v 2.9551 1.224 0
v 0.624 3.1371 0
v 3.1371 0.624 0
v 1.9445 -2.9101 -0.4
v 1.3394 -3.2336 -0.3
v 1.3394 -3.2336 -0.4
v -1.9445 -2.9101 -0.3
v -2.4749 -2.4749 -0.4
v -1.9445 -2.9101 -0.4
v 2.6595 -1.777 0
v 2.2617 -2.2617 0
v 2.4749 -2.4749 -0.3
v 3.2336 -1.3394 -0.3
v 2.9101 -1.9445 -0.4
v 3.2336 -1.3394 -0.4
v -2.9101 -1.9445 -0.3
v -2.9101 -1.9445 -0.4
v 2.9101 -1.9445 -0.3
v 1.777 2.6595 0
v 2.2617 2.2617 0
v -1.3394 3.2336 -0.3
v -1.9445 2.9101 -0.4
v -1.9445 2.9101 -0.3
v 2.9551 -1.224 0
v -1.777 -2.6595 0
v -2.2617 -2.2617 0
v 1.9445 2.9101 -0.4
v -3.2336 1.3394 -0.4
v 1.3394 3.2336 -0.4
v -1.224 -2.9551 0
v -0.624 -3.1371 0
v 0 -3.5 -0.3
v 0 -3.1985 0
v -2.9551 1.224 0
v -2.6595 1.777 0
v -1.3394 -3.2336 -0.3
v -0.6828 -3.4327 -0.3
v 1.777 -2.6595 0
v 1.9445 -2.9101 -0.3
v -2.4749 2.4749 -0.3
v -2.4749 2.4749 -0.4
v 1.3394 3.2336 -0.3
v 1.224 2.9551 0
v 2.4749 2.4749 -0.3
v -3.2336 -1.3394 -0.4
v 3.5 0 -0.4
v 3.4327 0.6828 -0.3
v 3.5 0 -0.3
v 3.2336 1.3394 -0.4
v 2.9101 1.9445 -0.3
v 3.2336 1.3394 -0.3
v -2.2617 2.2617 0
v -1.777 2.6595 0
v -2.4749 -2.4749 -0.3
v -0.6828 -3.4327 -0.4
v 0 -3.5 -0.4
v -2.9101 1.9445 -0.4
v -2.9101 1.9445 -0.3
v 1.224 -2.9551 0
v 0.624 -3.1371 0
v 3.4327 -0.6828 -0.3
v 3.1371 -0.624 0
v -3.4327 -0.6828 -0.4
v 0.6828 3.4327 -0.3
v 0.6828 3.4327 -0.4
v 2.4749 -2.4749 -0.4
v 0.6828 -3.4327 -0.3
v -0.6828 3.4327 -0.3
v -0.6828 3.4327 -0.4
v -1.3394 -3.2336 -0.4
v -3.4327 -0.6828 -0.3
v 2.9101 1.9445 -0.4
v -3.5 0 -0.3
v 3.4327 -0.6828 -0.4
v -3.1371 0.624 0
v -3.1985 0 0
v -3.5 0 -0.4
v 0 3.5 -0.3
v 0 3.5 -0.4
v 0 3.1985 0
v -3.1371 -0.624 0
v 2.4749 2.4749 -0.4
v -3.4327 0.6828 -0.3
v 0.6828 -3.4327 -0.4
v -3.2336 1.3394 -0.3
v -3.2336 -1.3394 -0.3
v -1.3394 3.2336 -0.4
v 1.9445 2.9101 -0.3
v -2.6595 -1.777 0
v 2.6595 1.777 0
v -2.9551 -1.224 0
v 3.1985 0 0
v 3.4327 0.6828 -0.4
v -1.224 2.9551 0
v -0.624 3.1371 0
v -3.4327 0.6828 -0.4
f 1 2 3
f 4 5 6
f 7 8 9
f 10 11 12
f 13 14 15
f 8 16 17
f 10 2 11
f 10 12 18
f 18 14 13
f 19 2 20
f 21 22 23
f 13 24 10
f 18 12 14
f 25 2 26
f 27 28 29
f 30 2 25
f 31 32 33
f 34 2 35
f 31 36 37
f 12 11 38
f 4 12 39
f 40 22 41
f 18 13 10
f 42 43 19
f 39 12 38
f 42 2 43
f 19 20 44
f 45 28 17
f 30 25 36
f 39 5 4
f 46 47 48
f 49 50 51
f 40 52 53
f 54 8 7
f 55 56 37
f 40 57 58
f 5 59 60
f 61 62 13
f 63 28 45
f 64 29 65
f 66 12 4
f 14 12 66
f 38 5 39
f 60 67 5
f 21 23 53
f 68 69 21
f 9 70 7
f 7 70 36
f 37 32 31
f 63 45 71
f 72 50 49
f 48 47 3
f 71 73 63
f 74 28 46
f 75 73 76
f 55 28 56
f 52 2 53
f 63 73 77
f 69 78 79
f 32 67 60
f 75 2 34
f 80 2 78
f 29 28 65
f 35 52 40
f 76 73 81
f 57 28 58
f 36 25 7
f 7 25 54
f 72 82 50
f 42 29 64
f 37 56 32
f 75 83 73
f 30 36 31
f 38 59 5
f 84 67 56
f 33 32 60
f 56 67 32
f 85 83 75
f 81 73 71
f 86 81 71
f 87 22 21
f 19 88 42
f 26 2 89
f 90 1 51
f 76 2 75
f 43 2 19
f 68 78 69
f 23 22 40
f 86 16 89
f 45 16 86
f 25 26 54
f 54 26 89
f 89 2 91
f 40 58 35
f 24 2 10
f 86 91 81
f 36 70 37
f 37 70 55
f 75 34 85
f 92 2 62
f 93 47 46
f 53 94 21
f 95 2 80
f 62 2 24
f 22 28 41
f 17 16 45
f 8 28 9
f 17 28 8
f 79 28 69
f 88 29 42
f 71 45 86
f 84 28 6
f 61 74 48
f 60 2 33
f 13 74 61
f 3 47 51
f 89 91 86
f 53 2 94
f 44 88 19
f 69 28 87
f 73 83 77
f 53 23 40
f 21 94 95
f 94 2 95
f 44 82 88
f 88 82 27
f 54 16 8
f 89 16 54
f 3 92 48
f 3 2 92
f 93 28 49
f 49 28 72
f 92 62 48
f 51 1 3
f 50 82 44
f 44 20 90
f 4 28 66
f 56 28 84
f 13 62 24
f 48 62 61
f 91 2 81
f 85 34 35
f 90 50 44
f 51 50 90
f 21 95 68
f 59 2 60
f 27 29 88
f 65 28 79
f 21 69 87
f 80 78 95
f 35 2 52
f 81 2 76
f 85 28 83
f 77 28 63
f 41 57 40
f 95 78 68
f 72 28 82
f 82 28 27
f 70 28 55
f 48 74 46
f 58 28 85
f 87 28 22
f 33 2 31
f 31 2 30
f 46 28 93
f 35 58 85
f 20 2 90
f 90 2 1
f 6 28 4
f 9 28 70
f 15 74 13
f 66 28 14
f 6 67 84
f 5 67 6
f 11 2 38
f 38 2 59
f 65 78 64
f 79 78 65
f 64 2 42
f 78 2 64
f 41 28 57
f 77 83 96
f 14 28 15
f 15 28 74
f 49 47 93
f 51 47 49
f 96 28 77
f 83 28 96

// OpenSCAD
// LibFile: stemfie_electrics.scad 
//   Author: Brendon Collecutt  
//   .
//   Contact: 1976016983@qq.com
//   .
//   This file is part of Stemfie_OpenSCAD.
//   .
//   Stemfie_OpenSCAD is free software: you can redistribute it and/or modify it under the terms of the GNU General Public License as published by the Free Software Foundation, either version 3 of the License, or (at your option) any later version.
//   .
//   Stemfie_OpenSCAD is distributed in the hope that it will be useful, but WITHOUT ANY WARRANTY; without even the implied warranty of MERCHANTABILITY or FITNESS FOR A PARTICULAR PURPOSE. See the GNU General Public License for more details.
//   .
//   You should have received a copy of the GNU General Public License along with Stemfie_OpenSCAD. If not, see <https://www.gnu.org/licenses/>.
//   .
//   Please check https://stemfie.org/license for more information or before using stemfie commercially.  
//   .
//   OpenSCAD script for creating Stemife.org parts.  
//   .
//   Feel free to adapt and improve and share your OpenSCAD script (please contact Paulo Kiefe)  
//   .
//   Contact: paulo.kiefe@stemfie.org (https://stemfie.org)
// Includes:
//   include <stemfie_electrics.scad>

include <stemfie.scad>

Terminal_Panel_Diameter = 8;
Terminal_Panel_Thickness = 2;
Terminal_Max_Diameter = 11;
Terminal_Length = 12;

// Module: motor_shaft()
// Usage:
//   motor_shaft(length = 1, thread_length = 0.75);
// Description:
//   Creates a internally threaded motor shaft.
// Example(3D):
//   motor_shaft();
module motor_shaft(length = 1, thread_length = 0.75)
{
  D()
  {
    Tz(Clearance)
      Cy(d = BU - Clearance * 2, h = length * BU - Clearance, C = false);

    BU_Tz(length)
      Rx(180)
        thread(length = thread_length, center = false, internal = true, bevel = [true, false]);
  }
}

// Module: motor_shaft_N20()
// Usage:
//   motor_shaft_N20(N20_shaft_length = 4);
// Description:
//   Creates STEMFIE motor shaft to fit N20 motor shaft.
// Example(3D)
//   motor_shaft_N20(N20_shaft_length = 7);
module motor_shaft_N20(N20_shaft_length = 4)
{
  min_thread_length = 0.5;
  thread_motor_shaft_gap = 0.4;
  shaft_length = ceil(min_thread_length + (N20_shaft_length + thread_motor_shaft_gap - 2) / BU);
  thread_length = shaft_length - (N20_shaft_length + thread_motor_shaft_gap - 2) / BU;

  BU_Tz(shaft_length)
    Rx(180)
      D()
      {
        U()
        {
          motor_shaft(length = shaft_length, thread_length = thread_length);

          Tz(-2)
            Cy(d = 9, h = 3, C = false);
        }
        Tz(-2)
        {
          D()
          {
            U()
              Cy(d = 3, h = (N20_shaft_length - Clearance) * 2);

            Ty(1.5)
              Cu([3, 1.1, N20_shaft_length * 2]);
          }

          Ty(0.5)
            Cu([3,1, (N20_shaft_length - Clearance) * 2]);
        }
      }
}


// Module: motor_case_N20()
// Usage:
//   motor_case_N20(motor_length = 24, half_only = true);
// Description:
//   Creates a STEMFIE motor case to fit an N20 geared motor.
// Example(3D): Standard case
//   motor_case_N20();
// Example(3D):
//   motor_case_N20(motor_length = 30, half_only = false);
module motor_case_N20(motor_length = 24, half_only = true)
{
  motor_width = 12;
  motor_height = 10;
  case_length = ceil(motor_length / BU) + 1;

  D()
  {
    //Main block
    BU_cube([3, case_length,1]);
    
    //Remove half
    if(half_only)
      BU_Tz(0.5)
        Cu([3 * BU + 1, case_length * BU + 1, BU], C = true);

    //Motor cutout
    BU_Ty(case_length / 2)
      Ty(-motor_length/2 - 2)
        Cu([motor_width + Clearance, motor_length + Clearance * 2, motor_height + Clearance]);

    //Motor shaft opening
    BU_Ty(case_length / 2)
      Rx(90)
        Cy(d = 10, h = BU + 2);

    //Motor rear end space.
    BU_Ty(-case_length / 2)
      T(-motor_width / 2, 6, -5.5/2)
        Cu([motor_width, case_length * BU - motor_length - 6, 5.5], C = false);

    RKy(180)
    {
      //STEMFIE mounting holes
      BU_Ty(0.5)
        BU_Tx(1)
          hole_grid([1,case_length - 1]);
      
      //Tab connector holes
      BU_T(x = -1.1, y = case_length/2 - 1)
        tab_connector_cutout();
      BU_T(x = 0.4, y = -case_length/2)
        Ty(3)
          tab_connector_cutout();

      //Banana terminal cutout
      BU_Tx(-1)
        BU_Ty(-case_length / 2)
          Rx(90)
            terminal_cutout();
    }
  }
}

// Module: terminal_cutout()
// Usage:
//   terminal_cutout(solder_tab = true);
// Description:
//   Creates a cutout to fit a banana terminal.
// Example(3D):
//   terminal_cutout();
// Example(3D): Split your part in two to fit the terminal inside.
//   difference()
//   {
//     BU_cube([2,1,1]);
//   
//     BU_Tx(1)
//       Ry(90)
//         Rz(90)
//           terminal_cutout();
//   
//     Tz(1.5 * BU)
//       cube(3 * BU, center = true);
//   }
module terminal_cutout(solder_tab = true)
{
  Sz(-1)
  {
    Tz(-0.1)
      Cy(h = Terminal_Panel_Thickness + 0.2, d = Terminal_Panel_Diameter + Clearance, C = false);

    Tz(Terminal_Panel_Thickness)
      Cy(h = Terminal_Length - Terminal_Panel_Thickness, d = Terminal_Max_Diameter + Clearance, C = false);

    Tz(Terminal_Length - 3)
      BU_Tx(1/2)
        Cu(BU + 0.1, 5.5, 6);
  }
}

// Module: tab_connector()
// Usage:
//   tab_connector(length = 1);
// Description:
//   Creates a tab to semi-permanently connect STEMFIE half blocks together.
// Example(3D): tabs for connecting 1 to 4 block units wide objects.
//   rotate([90,0, 0])
//     for(i=[1:4])
//       BU_Tx(i)
//         tab_connector(i);
module tab_connector(length = 1)
{
  {
    D()
    {
      U()
      {
        Cu([4.5 - Clearance,3- Clearance,2- Clearance], C = false);
        Cu([3- Clearance,3- Clearance,length * BU- Clearance * 2], C = false);
        Tz(length * BU - 2)
        Cu([5- Clearance,3- Clearance,2- Clearance], C = false);
      }
        Ty(-1)
        Tx(1.6)
        Ry(-99)
        Cu([length * BU,10,10], C = false);
    }
    
  }
}

// Module: tab_connector_cutout()
// Usage:
//   tab_connector_cutout(length = 1, C = true);
// Description:
//   Creates a tab cutout to semi-permanently connect STEMFIE half blocks together.
// Example(3D): 
//   difference()
//   {
//     BU_cube([1, 1, 1]);
//   
//     tab_connector_cutout(length = 1, C = true);
//   }
module tab_connector_cutout(length = 1, C = true)
{
  BU_Tz(C?-length/2:0)
    T(x = -2.5, y = -1.5)
    {
      Tz(-0.1)
        Cu([5,3,2.1], C = false);

      Cu([3,3,length * BU], C = false);

      Tz(length * BU - 2)
        Cu([5,3,2.1], C = false);
  }
}
